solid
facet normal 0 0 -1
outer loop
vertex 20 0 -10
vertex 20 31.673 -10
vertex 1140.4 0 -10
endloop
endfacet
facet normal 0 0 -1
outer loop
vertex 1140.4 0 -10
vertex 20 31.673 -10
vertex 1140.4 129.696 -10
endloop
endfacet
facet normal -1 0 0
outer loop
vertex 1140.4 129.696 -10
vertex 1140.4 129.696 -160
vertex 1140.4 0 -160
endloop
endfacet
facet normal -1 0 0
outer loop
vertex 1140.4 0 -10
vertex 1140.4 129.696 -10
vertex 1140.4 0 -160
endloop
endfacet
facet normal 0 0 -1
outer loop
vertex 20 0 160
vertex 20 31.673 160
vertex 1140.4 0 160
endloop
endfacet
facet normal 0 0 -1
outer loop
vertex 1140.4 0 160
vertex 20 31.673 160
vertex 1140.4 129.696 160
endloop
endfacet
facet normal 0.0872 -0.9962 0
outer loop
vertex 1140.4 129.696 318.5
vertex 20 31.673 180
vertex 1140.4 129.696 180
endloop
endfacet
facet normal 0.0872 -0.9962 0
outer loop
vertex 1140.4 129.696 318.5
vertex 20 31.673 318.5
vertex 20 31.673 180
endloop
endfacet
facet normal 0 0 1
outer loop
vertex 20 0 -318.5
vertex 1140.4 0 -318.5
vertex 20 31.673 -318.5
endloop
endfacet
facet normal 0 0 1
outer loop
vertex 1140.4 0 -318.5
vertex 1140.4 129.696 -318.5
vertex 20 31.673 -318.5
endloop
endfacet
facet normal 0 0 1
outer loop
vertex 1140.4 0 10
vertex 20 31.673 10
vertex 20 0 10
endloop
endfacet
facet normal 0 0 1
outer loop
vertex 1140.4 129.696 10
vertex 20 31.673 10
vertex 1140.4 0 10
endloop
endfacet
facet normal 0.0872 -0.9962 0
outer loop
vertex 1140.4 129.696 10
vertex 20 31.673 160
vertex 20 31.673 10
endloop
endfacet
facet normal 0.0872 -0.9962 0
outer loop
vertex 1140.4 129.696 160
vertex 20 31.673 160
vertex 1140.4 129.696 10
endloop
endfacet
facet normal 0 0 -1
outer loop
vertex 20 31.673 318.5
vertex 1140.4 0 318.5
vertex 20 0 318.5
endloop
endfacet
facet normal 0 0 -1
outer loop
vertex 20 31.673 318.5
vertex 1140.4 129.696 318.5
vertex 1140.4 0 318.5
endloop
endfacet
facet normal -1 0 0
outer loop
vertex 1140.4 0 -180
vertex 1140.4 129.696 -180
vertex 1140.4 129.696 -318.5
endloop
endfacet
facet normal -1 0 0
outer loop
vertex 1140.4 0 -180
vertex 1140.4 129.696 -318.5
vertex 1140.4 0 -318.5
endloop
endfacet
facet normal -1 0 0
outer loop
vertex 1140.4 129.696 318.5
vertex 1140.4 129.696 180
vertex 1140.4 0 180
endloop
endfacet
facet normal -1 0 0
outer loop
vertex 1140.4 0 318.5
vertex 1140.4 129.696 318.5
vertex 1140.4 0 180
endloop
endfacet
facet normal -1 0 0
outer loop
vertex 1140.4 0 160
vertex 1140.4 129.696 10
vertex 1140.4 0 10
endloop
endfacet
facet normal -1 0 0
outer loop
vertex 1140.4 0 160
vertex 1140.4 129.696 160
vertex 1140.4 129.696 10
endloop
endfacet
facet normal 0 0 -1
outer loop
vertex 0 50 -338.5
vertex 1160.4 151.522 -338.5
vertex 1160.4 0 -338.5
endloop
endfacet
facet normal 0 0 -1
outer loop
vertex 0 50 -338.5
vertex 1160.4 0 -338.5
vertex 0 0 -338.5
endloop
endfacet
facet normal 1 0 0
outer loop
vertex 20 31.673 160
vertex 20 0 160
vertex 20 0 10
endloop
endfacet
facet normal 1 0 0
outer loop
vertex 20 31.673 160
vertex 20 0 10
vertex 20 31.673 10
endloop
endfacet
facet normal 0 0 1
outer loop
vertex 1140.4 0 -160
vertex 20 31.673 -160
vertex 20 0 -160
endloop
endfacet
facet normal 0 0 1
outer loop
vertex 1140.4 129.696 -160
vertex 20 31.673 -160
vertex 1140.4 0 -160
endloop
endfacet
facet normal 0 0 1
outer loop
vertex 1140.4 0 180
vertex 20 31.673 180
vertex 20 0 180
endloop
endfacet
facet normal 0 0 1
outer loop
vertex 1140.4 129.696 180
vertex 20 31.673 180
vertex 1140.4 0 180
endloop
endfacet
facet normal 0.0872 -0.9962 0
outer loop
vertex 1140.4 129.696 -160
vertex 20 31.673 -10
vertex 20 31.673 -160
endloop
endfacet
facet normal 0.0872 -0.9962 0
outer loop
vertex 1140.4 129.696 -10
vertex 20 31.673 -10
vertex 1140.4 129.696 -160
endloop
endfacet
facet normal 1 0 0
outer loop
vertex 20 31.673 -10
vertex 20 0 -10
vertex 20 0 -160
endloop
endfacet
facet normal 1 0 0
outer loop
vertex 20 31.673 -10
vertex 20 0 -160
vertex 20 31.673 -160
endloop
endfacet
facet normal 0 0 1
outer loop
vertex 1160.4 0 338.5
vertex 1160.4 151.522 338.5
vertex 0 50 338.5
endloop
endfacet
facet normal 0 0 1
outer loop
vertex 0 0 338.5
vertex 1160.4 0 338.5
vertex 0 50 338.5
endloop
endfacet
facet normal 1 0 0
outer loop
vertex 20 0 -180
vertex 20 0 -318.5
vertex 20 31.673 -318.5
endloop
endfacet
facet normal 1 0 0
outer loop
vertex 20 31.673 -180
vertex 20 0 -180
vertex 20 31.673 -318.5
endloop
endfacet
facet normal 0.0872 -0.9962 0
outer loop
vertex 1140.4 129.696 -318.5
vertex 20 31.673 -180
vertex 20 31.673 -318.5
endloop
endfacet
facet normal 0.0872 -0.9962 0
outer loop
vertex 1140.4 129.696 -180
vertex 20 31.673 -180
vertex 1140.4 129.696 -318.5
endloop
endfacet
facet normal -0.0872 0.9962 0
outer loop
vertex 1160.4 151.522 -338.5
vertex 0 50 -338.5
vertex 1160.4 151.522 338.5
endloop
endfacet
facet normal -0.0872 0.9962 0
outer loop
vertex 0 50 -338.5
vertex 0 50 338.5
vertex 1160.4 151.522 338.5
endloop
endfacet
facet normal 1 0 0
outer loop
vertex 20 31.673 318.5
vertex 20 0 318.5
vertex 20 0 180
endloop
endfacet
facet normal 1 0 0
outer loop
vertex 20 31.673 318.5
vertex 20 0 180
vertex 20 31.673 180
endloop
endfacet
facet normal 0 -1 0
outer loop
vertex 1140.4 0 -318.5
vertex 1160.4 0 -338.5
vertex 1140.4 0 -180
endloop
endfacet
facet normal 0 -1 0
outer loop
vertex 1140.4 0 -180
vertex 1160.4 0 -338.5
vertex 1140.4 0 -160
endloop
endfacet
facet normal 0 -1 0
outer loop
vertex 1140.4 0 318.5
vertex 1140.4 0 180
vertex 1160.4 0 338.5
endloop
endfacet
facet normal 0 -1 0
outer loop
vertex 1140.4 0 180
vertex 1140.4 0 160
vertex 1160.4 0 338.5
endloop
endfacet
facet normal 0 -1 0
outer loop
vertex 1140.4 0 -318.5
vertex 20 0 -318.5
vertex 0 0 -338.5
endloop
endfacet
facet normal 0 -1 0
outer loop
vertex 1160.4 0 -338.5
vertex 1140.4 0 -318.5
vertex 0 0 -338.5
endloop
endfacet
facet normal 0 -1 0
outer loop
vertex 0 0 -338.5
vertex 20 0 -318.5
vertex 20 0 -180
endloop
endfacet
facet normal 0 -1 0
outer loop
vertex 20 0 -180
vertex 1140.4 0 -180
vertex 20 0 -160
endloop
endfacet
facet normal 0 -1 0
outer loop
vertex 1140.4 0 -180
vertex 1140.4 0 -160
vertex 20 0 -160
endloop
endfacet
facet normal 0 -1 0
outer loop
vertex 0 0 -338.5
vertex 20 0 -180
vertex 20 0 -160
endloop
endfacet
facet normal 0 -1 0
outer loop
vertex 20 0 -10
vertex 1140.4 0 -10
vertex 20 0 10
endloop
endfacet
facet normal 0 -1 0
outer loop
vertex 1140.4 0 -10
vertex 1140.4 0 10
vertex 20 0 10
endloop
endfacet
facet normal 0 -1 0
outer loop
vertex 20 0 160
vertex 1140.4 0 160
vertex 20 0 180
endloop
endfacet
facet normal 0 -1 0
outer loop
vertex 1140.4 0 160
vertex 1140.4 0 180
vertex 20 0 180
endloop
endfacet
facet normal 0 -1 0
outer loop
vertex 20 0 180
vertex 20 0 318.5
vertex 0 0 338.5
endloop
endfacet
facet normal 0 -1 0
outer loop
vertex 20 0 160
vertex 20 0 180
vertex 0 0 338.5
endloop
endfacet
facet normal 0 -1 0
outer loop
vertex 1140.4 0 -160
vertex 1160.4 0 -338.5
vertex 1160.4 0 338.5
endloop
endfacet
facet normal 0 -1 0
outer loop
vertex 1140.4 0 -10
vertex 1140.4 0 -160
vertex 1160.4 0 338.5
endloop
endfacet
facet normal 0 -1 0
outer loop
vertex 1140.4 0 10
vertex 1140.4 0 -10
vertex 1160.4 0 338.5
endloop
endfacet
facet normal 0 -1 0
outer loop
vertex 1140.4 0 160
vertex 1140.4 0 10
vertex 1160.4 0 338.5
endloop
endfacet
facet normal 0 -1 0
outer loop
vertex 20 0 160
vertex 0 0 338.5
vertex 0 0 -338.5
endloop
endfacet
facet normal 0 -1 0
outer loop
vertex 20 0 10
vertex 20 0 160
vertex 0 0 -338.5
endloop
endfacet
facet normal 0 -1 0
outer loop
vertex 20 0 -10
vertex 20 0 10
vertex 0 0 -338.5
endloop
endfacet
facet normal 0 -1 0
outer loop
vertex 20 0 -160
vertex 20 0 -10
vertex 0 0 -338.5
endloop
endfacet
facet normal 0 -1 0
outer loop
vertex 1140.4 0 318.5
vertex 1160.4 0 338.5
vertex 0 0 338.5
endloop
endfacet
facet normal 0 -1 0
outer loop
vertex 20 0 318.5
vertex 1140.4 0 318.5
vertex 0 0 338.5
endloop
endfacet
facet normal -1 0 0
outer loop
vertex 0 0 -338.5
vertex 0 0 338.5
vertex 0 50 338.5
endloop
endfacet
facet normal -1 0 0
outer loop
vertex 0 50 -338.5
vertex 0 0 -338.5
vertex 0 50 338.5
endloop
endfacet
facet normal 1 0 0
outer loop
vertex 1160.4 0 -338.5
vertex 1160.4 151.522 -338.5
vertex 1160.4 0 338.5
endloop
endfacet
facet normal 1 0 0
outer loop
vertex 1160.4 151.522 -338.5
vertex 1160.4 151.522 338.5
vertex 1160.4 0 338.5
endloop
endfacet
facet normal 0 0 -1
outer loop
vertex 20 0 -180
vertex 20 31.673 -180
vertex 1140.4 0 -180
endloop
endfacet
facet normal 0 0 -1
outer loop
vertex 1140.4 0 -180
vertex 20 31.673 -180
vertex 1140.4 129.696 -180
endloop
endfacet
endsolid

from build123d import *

# Parameters (mm, degrees)
SALIENTE_EXTRUIR1_DEPTH = 338.5
VACIADO1_T              = -20
SALIENTE_EXTRUIR2_DEPTH = 10
MATRIZL1_COUNT          = 2
MATRIZL1_PITCH          = 170
MATRIZL2_COUNT          = 2
MATRIZL2_PITCH          = 170


with BuildPart() as part:
    # Croquis1 → Saliente-Extruir1 (new, symmetric)
    with BuildSketch(Plane.XY):
        Polygon((0, 0), (0, 50), (1160.4, 151.521845155), (1160.4, 0), align=None)
    extrude(amount=SALIENTE_EXTRUIR1_DEPTH, both=True)

    # Vaciado1
    vaciado1_openings = [part.faces().sort_by_distance(p)[0] for p in [
        (580.2, 0, 0),
    ]]
    offset(amount=VACIADO1_T, openings=vaciado1_openings, kind=Kind.INTERSECTION)

    # Croquis2 → Saliente-Extruir2 (add, symmetric)
    with BuildSketch(Plane.XY):
        Polygon((20, 31.67337652), (20, 0), (1140.4, 0), (1140.4, 129.695675134), align=None)
    saliente_extruir2 = extrude(amount=SALIENTE_EXTRUIR2_DEPTH, both=True)

    # MatrizL1: Saliente-Extruir2 ×2
    with Locations(*[(0, 0, i * MATRIZL1_PITCH) for i in range(1, MATRIZL1_COUNT)]):
        add(saliente_extruir2)

    # MatrizL2: Saliente-Extruir2 ×2
    with Locations(*[(0, 0, -i * MATRIZL2_PITCH) for i in range(1, MATRIZL2_COUNT)]):
        add(saliente_extruir2)


solid = part.part
